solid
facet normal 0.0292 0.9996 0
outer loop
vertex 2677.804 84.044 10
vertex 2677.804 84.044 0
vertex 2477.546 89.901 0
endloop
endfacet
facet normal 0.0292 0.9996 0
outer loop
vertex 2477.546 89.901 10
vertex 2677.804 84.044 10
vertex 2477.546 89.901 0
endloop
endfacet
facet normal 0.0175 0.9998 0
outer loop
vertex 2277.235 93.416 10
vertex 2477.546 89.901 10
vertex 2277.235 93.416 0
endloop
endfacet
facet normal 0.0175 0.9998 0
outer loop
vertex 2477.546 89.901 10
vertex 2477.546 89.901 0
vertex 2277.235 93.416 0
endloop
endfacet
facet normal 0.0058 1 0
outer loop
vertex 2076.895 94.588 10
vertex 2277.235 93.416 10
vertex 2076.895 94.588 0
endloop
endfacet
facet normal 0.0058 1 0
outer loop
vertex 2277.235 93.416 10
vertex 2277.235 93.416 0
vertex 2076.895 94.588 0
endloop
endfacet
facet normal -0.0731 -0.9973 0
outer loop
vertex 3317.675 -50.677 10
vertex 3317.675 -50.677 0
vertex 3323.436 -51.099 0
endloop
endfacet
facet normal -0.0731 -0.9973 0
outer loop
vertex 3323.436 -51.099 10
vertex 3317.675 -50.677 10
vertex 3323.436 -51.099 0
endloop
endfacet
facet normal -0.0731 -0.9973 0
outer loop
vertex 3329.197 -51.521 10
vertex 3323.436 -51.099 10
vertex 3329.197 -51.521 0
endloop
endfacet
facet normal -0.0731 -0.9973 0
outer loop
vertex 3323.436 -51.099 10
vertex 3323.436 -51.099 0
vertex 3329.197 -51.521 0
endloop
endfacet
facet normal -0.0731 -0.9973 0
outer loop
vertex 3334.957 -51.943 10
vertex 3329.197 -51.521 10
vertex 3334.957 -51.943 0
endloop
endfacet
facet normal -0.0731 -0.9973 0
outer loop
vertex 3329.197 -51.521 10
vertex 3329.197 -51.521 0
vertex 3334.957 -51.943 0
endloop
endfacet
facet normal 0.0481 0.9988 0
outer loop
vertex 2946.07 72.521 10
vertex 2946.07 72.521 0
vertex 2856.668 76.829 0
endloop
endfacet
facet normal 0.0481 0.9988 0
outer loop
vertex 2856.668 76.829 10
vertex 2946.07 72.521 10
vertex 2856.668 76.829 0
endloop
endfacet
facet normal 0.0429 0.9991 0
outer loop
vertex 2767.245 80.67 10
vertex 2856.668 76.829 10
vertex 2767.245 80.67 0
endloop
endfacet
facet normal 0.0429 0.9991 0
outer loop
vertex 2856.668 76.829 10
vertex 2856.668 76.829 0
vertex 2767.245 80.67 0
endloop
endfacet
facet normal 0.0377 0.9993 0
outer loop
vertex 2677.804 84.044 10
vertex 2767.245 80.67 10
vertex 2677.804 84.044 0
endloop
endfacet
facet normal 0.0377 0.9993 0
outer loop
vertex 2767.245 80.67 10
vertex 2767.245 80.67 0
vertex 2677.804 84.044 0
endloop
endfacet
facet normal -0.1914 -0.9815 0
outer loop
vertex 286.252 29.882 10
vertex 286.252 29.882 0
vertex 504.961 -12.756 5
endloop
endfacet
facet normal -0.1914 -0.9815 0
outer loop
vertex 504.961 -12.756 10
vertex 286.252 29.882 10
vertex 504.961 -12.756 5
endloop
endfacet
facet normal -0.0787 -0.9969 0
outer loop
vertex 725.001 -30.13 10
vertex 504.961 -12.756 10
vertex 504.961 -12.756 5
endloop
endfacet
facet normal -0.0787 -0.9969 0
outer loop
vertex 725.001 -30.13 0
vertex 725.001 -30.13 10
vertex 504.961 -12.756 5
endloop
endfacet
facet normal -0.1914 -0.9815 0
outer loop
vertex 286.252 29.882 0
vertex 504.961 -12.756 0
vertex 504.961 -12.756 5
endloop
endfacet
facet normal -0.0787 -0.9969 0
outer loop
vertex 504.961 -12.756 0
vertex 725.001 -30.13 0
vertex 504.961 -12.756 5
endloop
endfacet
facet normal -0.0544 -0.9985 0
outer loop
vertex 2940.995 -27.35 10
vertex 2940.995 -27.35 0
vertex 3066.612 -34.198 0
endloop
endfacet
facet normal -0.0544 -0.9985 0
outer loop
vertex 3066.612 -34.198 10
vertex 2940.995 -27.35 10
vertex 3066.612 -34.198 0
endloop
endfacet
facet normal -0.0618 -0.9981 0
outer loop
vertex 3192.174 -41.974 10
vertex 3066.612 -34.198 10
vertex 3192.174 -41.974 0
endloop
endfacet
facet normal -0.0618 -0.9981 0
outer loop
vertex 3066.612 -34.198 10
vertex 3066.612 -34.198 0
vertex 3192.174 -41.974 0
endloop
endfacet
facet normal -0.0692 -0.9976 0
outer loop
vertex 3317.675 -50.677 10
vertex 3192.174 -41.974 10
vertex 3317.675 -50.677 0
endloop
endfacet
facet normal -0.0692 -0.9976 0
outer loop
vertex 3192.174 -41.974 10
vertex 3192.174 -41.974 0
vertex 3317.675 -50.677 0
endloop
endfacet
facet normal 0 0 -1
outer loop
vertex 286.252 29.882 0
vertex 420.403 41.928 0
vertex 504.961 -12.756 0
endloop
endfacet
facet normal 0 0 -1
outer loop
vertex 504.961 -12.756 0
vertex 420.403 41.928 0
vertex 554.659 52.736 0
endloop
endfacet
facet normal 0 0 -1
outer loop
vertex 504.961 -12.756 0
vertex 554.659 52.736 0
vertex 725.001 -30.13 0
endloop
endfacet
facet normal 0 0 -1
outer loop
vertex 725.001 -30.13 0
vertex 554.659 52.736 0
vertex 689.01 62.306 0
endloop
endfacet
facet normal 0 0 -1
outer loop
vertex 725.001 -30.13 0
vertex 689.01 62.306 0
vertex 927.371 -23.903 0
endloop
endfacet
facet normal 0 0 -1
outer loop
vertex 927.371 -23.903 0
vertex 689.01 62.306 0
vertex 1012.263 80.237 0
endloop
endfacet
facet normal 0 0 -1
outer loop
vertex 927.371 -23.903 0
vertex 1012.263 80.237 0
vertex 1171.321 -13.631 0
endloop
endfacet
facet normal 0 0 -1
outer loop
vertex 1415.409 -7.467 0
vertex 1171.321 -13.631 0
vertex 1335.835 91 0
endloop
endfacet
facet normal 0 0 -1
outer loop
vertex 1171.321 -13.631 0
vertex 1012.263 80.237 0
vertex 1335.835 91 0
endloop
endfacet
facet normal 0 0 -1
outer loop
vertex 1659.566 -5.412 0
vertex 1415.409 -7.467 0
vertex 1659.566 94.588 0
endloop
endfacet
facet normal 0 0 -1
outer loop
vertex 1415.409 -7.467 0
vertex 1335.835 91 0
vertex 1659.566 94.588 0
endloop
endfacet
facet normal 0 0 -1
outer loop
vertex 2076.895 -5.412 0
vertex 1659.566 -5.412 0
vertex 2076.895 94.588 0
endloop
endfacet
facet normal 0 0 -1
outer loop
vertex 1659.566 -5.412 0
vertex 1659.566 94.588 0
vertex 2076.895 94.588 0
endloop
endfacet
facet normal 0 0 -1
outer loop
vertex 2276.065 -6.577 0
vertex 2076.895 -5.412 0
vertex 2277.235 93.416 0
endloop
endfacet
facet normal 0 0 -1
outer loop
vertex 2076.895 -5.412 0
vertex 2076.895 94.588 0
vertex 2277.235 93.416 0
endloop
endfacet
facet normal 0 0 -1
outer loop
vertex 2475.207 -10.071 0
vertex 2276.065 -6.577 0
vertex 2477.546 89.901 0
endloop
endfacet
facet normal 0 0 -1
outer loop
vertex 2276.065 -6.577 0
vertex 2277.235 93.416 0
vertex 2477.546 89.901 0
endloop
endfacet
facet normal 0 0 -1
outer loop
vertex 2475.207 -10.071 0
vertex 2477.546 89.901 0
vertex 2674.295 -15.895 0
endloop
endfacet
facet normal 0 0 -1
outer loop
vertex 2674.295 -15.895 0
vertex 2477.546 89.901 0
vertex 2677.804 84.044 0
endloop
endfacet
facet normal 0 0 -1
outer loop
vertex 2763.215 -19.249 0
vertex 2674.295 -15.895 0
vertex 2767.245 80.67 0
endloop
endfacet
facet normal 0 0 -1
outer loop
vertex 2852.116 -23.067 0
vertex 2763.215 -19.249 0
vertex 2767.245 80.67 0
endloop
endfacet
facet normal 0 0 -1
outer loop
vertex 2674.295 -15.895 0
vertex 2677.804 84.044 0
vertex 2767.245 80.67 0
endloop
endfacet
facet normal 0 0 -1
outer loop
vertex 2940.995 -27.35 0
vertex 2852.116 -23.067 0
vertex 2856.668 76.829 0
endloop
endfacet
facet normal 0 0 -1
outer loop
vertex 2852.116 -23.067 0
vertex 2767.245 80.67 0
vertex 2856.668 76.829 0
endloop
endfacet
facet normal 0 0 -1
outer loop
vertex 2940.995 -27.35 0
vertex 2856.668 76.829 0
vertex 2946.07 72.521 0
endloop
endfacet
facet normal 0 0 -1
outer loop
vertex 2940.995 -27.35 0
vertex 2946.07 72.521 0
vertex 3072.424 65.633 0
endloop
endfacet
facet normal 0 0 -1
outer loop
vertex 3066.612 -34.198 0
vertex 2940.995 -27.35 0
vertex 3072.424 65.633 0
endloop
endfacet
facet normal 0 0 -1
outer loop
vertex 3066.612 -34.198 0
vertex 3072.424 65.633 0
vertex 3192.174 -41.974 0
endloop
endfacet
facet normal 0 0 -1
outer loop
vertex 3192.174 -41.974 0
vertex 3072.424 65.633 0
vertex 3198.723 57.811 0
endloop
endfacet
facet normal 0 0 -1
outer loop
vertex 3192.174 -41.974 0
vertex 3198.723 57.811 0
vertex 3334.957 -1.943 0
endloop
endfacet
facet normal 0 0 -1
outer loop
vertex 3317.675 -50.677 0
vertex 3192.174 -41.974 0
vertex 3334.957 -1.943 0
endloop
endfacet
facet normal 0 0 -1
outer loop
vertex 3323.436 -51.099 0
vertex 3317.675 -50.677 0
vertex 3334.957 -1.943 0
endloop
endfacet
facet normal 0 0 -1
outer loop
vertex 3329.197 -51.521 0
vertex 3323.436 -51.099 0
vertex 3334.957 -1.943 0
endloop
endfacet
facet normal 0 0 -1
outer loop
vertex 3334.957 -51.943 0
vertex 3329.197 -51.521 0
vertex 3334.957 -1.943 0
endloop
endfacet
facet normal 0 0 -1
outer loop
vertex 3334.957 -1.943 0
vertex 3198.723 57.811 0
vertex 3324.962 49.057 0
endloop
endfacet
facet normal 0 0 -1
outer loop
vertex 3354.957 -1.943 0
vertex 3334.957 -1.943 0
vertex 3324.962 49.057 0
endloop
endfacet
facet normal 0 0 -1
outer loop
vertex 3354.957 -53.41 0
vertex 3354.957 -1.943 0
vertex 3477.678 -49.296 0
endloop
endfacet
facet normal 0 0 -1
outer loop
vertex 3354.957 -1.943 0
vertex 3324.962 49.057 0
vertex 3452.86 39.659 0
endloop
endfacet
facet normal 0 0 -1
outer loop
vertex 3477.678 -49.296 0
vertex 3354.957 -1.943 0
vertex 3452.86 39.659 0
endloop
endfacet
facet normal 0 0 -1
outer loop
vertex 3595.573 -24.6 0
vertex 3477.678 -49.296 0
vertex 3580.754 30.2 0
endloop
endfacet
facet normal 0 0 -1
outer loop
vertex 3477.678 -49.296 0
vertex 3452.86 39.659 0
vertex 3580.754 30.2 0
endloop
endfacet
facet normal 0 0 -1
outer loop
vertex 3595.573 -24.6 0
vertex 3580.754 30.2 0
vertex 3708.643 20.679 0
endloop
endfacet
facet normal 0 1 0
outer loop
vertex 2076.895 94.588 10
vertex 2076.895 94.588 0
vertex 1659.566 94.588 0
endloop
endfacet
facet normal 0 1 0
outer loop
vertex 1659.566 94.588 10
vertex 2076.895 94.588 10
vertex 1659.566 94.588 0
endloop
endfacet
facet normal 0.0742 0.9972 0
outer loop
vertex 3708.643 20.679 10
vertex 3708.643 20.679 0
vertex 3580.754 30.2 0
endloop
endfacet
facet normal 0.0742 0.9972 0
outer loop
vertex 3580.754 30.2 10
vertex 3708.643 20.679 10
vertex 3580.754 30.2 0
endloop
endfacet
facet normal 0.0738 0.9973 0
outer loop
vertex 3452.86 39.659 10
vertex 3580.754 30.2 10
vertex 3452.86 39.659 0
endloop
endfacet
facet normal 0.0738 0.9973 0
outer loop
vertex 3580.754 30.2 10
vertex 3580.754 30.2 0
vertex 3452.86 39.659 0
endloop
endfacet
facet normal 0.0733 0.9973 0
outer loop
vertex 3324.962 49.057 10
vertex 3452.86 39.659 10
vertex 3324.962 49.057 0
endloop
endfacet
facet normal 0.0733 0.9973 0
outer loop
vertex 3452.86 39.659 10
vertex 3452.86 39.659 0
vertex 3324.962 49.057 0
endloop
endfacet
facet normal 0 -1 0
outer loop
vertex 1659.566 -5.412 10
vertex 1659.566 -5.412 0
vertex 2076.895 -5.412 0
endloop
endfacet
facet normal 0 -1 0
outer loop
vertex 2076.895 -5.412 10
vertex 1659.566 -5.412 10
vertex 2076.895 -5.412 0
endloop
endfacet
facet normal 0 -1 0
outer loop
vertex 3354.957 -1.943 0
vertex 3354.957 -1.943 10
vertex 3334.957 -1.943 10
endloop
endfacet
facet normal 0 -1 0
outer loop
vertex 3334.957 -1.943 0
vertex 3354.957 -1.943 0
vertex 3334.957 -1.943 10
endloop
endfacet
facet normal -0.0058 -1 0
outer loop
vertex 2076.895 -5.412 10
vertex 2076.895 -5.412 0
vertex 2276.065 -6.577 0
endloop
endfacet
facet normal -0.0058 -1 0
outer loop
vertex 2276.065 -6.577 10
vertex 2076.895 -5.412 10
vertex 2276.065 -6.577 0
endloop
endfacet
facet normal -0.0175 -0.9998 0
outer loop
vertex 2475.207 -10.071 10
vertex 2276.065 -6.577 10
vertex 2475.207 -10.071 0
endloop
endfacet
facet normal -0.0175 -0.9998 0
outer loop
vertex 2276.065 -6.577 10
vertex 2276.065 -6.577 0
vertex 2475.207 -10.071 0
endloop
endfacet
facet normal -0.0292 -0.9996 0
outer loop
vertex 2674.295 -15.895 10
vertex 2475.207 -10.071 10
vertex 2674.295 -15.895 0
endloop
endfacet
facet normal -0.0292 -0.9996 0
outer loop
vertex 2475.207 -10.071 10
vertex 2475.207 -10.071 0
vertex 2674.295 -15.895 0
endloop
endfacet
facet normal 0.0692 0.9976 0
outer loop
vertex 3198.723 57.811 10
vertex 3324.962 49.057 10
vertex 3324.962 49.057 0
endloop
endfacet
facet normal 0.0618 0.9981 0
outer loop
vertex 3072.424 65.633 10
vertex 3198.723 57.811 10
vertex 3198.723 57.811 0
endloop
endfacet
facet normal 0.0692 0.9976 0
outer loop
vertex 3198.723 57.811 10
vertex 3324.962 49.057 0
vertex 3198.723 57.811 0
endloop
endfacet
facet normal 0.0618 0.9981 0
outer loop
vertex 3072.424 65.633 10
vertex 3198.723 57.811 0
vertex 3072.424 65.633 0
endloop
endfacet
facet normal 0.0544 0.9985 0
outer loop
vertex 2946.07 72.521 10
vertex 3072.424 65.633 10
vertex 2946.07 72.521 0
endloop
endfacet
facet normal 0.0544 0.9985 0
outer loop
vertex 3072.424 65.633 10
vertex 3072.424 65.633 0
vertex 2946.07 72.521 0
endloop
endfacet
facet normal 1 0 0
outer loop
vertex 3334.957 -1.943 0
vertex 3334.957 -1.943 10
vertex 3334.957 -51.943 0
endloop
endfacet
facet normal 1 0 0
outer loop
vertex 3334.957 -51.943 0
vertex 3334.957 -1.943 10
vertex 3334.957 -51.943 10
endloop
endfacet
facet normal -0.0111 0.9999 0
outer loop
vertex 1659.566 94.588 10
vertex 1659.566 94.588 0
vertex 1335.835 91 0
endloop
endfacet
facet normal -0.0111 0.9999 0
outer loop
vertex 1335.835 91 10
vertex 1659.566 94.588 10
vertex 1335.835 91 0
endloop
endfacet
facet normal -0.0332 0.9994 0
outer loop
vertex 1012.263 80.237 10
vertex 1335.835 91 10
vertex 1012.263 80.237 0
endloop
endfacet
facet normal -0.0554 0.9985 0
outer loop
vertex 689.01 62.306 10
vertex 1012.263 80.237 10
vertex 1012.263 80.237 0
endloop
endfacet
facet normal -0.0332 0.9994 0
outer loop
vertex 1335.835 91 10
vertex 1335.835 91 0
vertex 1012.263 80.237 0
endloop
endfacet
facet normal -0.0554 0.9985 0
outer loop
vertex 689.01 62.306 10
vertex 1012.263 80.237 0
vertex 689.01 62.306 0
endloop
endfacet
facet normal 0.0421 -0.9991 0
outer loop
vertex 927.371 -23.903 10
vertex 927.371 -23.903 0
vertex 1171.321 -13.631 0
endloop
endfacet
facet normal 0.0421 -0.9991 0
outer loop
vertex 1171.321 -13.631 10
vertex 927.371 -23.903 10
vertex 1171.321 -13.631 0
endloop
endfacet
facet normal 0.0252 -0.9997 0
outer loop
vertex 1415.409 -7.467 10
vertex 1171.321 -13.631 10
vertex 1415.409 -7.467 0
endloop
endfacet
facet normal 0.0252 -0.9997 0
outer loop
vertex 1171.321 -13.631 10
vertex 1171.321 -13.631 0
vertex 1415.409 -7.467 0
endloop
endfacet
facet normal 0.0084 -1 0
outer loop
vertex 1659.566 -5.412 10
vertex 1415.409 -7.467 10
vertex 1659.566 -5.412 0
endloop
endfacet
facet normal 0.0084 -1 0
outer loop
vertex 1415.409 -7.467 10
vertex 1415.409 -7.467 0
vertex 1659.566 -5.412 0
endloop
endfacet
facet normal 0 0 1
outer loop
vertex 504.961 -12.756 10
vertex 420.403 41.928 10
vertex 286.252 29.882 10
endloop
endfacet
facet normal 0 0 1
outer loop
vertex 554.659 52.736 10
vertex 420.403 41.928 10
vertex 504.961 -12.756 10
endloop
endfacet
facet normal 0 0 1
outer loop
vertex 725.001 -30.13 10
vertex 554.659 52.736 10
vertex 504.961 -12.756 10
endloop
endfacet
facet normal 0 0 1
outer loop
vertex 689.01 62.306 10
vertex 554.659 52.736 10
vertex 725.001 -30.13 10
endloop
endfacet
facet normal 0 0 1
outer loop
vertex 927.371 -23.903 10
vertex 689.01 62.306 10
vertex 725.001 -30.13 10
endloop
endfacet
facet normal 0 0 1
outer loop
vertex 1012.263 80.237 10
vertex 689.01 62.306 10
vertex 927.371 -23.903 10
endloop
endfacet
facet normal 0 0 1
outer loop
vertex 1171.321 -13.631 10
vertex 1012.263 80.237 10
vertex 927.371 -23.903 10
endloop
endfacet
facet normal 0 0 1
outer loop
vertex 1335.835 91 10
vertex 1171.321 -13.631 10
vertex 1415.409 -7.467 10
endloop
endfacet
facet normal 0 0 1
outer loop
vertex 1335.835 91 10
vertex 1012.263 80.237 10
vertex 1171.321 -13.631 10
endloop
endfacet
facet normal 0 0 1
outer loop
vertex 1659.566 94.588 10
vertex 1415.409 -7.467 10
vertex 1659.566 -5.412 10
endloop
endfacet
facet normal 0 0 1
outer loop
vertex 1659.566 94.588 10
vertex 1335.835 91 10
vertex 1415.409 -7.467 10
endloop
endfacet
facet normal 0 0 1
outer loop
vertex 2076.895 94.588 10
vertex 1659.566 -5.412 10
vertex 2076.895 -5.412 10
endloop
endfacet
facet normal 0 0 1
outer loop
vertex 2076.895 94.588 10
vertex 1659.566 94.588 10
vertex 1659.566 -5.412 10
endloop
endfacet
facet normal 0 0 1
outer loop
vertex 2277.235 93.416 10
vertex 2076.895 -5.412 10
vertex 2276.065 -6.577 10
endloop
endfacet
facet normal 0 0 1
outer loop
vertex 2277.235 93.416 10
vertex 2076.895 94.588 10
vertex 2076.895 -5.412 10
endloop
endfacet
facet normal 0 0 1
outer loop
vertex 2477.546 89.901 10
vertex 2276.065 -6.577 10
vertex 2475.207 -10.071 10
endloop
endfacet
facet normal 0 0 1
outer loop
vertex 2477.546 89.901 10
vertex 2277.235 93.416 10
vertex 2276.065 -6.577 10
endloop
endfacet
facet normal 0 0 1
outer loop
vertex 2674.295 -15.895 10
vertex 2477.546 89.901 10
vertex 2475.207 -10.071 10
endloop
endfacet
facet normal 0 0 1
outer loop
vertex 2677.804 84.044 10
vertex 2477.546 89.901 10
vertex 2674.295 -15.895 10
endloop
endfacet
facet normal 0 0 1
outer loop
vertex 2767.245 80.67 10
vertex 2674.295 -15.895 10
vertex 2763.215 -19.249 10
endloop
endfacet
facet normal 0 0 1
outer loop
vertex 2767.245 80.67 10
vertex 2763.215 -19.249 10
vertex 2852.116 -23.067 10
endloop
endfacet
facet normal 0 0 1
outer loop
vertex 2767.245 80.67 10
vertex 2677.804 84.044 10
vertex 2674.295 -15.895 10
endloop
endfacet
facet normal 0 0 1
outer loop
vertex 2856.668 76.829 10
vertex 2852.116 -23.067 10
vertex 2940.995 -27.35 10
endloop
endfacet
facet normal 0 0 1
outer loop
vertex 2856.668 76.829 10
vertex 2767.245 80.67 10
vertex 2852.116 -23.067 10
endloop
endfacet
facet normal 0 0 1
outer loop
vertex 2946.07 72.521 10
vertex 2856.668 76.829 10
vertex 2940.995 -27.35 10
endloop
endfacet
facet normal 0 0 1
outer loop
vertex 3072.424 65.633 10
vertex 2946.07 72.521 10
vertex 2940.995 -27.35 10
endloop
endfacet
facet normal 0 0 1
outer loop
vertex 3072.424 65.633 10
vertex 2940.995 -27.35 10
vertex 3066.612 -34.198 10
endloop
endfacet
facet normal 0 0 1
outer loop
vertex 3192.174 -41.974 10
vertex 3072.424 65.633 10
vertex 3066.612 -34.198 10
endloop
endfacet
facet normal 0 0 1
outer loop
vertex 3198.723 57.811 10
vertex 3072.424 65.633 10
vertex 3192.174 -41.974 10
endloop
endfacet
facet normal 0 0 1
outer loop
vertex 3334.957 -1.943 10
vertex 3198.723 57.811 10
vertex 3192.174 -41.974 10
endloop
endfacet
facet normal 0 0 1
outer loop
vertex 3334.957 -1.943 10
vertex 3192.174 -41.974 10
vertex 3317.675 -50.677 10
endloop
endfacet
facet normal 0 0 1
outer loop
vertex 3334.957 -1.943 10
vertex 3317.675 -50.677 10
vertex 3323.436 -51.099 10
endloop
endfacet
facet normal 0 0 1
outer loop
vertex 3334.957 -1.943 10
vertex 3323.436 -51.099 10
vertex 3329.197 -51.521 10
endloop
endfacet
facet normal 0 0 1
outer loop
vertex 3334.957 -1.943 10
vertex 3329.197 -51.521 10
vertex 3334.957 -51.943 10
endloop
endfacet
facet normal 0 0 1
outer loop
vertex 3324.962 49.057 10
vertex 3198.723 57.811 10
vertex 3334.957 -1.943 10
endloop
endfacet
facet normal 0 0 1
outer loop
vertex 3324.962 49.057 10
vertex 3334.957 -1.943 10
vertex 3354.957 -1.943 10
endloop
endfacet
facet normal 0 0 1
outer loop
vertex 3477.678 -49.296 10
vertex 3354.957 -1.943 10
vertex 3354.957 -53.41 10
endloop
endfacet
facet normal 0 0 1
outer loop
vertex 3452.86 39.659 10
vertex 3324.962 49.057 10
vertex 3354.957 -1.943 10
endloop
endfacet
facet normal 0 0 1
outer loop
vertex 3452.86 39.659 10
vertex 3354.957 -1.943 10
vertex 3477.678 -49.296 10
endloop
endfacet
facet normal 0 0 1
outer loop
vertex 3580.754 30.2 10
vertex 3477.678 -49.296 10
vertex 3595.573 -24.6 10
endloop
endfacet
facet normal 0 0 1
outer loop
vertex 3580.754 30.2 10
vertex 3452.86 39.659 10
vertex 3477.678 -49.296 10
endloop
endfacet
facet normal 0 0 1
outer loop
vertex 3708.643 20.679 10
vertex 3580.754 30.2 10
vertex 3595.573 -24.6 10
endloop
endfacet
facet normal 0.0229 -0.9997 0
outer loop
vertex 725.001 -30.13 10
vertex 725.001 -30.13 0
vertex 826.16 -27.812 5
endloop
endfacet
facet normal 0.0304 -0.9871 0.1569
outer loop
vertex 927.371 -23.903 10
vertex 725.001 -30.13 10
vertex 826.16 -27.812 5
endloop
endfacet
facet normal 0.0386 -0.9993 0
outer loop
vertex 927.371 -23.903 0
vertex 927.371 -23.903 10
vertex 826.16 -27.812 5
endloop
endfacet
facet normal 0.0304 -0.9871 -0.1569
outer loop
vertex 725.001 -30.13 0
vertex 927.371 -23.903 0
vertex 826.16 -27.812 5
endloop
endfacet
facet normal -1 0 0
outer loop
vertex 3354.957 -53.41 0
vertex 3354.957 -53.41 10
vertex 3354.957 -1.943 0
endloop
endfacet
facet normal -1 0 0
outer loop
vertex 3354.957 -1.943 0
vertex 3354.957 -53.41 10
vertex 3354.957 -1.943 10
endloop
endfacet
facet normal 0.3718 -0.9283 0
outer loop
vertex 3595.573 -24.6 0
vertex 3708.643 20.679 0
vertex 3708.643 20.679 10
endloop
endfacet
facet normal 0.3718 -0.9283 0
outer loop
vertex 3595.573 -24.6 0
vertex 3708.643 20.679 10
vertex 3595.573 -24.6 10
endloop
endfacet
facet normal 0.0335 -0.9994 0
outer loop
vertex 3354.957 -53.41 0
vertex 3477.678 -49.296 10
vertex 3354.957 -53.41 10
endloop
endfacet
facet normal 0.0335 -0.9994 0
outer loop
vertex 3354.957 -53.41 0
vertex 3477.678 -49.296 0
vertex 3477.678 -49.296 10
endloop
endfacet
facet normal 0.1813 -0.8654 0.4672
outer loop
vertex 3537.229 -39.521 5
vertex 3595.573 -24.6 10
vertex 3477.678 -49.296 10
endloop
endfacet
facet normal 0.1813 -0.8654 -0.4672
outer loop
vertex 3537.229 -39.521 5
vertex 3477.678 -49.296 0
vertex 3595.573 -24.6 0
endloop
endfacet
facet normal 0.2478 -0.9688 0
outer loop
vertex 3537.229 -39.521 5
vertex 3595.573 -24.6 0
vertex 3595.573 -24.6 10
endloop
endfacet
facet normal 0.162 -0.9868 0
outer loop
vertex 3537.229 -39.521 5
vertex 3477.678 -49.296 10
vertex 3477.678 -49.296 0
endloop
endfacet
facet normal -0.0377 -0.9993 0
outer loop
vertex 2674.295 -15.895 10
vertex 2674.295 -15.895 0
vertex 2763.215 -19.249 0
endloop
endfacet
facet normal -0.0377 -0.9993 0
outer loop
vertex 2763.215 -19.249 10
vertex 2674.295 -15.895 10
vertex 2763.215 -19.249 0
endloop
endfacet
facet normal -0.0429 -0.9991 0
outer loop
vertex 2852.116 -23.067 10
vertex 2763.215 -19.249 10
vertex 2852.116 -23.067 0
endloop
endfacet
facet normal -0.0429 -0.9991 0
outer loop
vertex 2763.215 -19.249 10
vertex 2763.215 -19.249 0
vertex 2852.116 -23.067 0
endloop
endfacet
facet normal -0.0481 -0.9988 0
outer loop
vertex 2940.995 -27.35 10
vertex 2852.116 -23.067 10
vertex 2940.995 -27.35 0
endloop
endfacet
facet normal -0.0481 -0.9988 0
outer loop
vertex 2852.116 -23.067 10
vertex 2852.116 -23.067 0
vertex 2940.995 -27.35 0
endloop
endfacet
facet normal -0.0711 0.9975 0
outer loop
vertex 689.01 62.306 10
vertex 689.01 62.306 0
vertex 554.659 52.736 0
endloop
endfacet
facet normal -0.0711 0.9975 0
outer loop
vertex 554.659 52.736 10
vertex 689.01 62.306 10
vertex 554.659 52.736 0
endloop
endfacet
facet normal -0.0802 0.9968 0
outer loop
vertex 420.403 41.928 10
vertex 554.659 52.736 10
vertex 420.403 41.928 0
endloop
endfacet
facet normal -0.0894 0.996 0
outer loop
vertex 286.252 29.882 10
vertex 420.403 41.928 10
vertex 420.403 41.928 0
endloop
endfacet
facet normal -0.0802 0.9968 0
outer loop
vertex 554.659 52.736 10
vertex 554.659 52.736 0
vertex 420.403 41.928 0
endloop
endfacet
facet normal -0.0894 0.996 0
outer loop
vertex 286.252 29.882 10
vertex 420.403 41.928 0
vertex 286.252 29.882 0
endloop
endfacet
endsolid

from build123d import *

# Parameters (mm, degrees)
BOSS_EXTRUDE1_DEPTH = 10
CUT_EXTRUDE1_DEPTH  = 3710.862109794


with BuildPart() as part:
    # Sketch1 → Boss-Extrude1 (new body)
    with BuildSketch(Plane.XY):
        with BuildLine():
            ThreePointArc((927.370608086, -23.902888447), (1293.351644263, -10.035647291), (1659.566121622, -5.412251186))
            Line((1659.566121622, -5.412251186), (2076.89523305, -5.412251186))
            ThreePointArc((2076.89523305, -5.412251186), (2375.641258252, -8.033022811), (2674.295326878, -15.894530989))
            ThreePointArc((2674.295326878, -15.894530989), (2807.667775437, -21.099833603), (2940.995326878, -27.350372482))
            ThreePointArc((2940.995326878, -27.350372482), (3129.39992894, -37.970043076), (3317.675281863, -50.676850811))
            ThreePointArc((3317.675281863, -50.676850811), (3336.316403493, -52.042821656), (3354.957429761, -53.410093259))
            add(Edge.make_bspline(
                [(3708.642612964, 20.678794226), (3542.658351866, -62.676383397), (3354.957429761, -53.410093259)],
                knots=[0, 0, 0, 0.910126354, 0.910126354, 0.910126354], degree=2))
            ThreePointArc((3708.642612964, 20.678794226), (3516.807267992, 34.936923471), (3324.961736788, 49.057333773))
            ThreePointArc((3324.961736788, 49.057333773), (3135.580740786, 61.838761971), (2946.069736633, 72.520796359))
            ThreePointArc((2946.069736633, 72.520796359), (2811.95922193, 78.808041397), (2677.803546453, 84.043912041))
            ThreePointArc((2677.803546453, 84.043912041), (2377.395638046, 91.951586762), (2076.89523305, 94.587748814))
            Line((2076.89523305, 94.587748814), (1659.566121622, 94.587748814))
            ThreePointArc((1659.566121622, 94.587748814), (1174.01952466, 86.51504314), (689.009647082, 62.305849623))
            ThreePointArc((689.009647082, 62.305849623), (487.518786709, 47.486939475), (286.252176699, 29.882434183))
            add(Edge.make_bspline(
                [(286.252176699, 29.882434183), (504.29651375, -25.388068548), (725.000553962, -30.129594175)],
                knots=[0, 0, 0, 0.68624514, 0.68624514, 0.68624514], degree=2))
            add(Edge.make_bspline(
                [(725.000553962, -30.129594175), (826.134643966, -28.608253563), (927.370608086, -23.902888447)],
                knots=[0.782175284, 0.782175284, 0.782175284, 1, 1, 1], degree=2))
        make_face()
    extrude(amount=BOSS_EXTRUDE1_DEPTH)

    # Sketch2 → Cut-Extrude1 (cut, through all)
    with BuildSketch(Plane.XY.offset(10)):
        with BuildLine():
            Line((3354.957429764, -53.410093259), (3354.957429764, -1.943195553))
            Line((3354.957429764, -1.943195553), (3334.957429764, -1.943195553))
            Line((3334.957429764, -1.943195553), (3334.957429764, -51.943195553))
            ThreePointArc((3334.957429764, -51.943195553), (3344.957443491, -52.67645724), (3354.957429764, -53.410093259))
        make_face()
    extrude(amount=-CUT_EXTRUDE1_DEPTH, mode=Mode.SUBTRACT)


solid = part.part
